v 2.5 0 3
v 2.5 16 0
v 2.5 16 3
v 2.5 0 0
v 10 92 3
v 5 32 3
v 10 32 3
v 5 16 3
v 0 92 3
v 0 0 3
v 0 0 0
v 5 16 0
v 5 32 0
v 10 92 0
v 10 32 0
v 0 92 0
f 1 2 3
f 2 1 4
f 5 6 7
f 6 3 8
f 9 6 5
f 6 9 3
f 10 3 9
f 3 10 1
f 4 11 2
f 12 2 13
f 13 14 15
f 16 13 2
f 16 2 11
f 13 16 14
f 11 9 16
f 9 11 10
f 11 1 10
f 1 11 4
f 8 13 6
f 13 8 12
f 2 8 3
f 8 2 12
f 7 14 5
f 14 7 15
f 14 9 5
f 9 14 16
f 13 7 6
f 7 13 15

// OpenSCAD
// Fence shims 2.5 / 5 / 10 mm.
include <../cad/punch_rig_v3_003.scad>
PART = "shims";
